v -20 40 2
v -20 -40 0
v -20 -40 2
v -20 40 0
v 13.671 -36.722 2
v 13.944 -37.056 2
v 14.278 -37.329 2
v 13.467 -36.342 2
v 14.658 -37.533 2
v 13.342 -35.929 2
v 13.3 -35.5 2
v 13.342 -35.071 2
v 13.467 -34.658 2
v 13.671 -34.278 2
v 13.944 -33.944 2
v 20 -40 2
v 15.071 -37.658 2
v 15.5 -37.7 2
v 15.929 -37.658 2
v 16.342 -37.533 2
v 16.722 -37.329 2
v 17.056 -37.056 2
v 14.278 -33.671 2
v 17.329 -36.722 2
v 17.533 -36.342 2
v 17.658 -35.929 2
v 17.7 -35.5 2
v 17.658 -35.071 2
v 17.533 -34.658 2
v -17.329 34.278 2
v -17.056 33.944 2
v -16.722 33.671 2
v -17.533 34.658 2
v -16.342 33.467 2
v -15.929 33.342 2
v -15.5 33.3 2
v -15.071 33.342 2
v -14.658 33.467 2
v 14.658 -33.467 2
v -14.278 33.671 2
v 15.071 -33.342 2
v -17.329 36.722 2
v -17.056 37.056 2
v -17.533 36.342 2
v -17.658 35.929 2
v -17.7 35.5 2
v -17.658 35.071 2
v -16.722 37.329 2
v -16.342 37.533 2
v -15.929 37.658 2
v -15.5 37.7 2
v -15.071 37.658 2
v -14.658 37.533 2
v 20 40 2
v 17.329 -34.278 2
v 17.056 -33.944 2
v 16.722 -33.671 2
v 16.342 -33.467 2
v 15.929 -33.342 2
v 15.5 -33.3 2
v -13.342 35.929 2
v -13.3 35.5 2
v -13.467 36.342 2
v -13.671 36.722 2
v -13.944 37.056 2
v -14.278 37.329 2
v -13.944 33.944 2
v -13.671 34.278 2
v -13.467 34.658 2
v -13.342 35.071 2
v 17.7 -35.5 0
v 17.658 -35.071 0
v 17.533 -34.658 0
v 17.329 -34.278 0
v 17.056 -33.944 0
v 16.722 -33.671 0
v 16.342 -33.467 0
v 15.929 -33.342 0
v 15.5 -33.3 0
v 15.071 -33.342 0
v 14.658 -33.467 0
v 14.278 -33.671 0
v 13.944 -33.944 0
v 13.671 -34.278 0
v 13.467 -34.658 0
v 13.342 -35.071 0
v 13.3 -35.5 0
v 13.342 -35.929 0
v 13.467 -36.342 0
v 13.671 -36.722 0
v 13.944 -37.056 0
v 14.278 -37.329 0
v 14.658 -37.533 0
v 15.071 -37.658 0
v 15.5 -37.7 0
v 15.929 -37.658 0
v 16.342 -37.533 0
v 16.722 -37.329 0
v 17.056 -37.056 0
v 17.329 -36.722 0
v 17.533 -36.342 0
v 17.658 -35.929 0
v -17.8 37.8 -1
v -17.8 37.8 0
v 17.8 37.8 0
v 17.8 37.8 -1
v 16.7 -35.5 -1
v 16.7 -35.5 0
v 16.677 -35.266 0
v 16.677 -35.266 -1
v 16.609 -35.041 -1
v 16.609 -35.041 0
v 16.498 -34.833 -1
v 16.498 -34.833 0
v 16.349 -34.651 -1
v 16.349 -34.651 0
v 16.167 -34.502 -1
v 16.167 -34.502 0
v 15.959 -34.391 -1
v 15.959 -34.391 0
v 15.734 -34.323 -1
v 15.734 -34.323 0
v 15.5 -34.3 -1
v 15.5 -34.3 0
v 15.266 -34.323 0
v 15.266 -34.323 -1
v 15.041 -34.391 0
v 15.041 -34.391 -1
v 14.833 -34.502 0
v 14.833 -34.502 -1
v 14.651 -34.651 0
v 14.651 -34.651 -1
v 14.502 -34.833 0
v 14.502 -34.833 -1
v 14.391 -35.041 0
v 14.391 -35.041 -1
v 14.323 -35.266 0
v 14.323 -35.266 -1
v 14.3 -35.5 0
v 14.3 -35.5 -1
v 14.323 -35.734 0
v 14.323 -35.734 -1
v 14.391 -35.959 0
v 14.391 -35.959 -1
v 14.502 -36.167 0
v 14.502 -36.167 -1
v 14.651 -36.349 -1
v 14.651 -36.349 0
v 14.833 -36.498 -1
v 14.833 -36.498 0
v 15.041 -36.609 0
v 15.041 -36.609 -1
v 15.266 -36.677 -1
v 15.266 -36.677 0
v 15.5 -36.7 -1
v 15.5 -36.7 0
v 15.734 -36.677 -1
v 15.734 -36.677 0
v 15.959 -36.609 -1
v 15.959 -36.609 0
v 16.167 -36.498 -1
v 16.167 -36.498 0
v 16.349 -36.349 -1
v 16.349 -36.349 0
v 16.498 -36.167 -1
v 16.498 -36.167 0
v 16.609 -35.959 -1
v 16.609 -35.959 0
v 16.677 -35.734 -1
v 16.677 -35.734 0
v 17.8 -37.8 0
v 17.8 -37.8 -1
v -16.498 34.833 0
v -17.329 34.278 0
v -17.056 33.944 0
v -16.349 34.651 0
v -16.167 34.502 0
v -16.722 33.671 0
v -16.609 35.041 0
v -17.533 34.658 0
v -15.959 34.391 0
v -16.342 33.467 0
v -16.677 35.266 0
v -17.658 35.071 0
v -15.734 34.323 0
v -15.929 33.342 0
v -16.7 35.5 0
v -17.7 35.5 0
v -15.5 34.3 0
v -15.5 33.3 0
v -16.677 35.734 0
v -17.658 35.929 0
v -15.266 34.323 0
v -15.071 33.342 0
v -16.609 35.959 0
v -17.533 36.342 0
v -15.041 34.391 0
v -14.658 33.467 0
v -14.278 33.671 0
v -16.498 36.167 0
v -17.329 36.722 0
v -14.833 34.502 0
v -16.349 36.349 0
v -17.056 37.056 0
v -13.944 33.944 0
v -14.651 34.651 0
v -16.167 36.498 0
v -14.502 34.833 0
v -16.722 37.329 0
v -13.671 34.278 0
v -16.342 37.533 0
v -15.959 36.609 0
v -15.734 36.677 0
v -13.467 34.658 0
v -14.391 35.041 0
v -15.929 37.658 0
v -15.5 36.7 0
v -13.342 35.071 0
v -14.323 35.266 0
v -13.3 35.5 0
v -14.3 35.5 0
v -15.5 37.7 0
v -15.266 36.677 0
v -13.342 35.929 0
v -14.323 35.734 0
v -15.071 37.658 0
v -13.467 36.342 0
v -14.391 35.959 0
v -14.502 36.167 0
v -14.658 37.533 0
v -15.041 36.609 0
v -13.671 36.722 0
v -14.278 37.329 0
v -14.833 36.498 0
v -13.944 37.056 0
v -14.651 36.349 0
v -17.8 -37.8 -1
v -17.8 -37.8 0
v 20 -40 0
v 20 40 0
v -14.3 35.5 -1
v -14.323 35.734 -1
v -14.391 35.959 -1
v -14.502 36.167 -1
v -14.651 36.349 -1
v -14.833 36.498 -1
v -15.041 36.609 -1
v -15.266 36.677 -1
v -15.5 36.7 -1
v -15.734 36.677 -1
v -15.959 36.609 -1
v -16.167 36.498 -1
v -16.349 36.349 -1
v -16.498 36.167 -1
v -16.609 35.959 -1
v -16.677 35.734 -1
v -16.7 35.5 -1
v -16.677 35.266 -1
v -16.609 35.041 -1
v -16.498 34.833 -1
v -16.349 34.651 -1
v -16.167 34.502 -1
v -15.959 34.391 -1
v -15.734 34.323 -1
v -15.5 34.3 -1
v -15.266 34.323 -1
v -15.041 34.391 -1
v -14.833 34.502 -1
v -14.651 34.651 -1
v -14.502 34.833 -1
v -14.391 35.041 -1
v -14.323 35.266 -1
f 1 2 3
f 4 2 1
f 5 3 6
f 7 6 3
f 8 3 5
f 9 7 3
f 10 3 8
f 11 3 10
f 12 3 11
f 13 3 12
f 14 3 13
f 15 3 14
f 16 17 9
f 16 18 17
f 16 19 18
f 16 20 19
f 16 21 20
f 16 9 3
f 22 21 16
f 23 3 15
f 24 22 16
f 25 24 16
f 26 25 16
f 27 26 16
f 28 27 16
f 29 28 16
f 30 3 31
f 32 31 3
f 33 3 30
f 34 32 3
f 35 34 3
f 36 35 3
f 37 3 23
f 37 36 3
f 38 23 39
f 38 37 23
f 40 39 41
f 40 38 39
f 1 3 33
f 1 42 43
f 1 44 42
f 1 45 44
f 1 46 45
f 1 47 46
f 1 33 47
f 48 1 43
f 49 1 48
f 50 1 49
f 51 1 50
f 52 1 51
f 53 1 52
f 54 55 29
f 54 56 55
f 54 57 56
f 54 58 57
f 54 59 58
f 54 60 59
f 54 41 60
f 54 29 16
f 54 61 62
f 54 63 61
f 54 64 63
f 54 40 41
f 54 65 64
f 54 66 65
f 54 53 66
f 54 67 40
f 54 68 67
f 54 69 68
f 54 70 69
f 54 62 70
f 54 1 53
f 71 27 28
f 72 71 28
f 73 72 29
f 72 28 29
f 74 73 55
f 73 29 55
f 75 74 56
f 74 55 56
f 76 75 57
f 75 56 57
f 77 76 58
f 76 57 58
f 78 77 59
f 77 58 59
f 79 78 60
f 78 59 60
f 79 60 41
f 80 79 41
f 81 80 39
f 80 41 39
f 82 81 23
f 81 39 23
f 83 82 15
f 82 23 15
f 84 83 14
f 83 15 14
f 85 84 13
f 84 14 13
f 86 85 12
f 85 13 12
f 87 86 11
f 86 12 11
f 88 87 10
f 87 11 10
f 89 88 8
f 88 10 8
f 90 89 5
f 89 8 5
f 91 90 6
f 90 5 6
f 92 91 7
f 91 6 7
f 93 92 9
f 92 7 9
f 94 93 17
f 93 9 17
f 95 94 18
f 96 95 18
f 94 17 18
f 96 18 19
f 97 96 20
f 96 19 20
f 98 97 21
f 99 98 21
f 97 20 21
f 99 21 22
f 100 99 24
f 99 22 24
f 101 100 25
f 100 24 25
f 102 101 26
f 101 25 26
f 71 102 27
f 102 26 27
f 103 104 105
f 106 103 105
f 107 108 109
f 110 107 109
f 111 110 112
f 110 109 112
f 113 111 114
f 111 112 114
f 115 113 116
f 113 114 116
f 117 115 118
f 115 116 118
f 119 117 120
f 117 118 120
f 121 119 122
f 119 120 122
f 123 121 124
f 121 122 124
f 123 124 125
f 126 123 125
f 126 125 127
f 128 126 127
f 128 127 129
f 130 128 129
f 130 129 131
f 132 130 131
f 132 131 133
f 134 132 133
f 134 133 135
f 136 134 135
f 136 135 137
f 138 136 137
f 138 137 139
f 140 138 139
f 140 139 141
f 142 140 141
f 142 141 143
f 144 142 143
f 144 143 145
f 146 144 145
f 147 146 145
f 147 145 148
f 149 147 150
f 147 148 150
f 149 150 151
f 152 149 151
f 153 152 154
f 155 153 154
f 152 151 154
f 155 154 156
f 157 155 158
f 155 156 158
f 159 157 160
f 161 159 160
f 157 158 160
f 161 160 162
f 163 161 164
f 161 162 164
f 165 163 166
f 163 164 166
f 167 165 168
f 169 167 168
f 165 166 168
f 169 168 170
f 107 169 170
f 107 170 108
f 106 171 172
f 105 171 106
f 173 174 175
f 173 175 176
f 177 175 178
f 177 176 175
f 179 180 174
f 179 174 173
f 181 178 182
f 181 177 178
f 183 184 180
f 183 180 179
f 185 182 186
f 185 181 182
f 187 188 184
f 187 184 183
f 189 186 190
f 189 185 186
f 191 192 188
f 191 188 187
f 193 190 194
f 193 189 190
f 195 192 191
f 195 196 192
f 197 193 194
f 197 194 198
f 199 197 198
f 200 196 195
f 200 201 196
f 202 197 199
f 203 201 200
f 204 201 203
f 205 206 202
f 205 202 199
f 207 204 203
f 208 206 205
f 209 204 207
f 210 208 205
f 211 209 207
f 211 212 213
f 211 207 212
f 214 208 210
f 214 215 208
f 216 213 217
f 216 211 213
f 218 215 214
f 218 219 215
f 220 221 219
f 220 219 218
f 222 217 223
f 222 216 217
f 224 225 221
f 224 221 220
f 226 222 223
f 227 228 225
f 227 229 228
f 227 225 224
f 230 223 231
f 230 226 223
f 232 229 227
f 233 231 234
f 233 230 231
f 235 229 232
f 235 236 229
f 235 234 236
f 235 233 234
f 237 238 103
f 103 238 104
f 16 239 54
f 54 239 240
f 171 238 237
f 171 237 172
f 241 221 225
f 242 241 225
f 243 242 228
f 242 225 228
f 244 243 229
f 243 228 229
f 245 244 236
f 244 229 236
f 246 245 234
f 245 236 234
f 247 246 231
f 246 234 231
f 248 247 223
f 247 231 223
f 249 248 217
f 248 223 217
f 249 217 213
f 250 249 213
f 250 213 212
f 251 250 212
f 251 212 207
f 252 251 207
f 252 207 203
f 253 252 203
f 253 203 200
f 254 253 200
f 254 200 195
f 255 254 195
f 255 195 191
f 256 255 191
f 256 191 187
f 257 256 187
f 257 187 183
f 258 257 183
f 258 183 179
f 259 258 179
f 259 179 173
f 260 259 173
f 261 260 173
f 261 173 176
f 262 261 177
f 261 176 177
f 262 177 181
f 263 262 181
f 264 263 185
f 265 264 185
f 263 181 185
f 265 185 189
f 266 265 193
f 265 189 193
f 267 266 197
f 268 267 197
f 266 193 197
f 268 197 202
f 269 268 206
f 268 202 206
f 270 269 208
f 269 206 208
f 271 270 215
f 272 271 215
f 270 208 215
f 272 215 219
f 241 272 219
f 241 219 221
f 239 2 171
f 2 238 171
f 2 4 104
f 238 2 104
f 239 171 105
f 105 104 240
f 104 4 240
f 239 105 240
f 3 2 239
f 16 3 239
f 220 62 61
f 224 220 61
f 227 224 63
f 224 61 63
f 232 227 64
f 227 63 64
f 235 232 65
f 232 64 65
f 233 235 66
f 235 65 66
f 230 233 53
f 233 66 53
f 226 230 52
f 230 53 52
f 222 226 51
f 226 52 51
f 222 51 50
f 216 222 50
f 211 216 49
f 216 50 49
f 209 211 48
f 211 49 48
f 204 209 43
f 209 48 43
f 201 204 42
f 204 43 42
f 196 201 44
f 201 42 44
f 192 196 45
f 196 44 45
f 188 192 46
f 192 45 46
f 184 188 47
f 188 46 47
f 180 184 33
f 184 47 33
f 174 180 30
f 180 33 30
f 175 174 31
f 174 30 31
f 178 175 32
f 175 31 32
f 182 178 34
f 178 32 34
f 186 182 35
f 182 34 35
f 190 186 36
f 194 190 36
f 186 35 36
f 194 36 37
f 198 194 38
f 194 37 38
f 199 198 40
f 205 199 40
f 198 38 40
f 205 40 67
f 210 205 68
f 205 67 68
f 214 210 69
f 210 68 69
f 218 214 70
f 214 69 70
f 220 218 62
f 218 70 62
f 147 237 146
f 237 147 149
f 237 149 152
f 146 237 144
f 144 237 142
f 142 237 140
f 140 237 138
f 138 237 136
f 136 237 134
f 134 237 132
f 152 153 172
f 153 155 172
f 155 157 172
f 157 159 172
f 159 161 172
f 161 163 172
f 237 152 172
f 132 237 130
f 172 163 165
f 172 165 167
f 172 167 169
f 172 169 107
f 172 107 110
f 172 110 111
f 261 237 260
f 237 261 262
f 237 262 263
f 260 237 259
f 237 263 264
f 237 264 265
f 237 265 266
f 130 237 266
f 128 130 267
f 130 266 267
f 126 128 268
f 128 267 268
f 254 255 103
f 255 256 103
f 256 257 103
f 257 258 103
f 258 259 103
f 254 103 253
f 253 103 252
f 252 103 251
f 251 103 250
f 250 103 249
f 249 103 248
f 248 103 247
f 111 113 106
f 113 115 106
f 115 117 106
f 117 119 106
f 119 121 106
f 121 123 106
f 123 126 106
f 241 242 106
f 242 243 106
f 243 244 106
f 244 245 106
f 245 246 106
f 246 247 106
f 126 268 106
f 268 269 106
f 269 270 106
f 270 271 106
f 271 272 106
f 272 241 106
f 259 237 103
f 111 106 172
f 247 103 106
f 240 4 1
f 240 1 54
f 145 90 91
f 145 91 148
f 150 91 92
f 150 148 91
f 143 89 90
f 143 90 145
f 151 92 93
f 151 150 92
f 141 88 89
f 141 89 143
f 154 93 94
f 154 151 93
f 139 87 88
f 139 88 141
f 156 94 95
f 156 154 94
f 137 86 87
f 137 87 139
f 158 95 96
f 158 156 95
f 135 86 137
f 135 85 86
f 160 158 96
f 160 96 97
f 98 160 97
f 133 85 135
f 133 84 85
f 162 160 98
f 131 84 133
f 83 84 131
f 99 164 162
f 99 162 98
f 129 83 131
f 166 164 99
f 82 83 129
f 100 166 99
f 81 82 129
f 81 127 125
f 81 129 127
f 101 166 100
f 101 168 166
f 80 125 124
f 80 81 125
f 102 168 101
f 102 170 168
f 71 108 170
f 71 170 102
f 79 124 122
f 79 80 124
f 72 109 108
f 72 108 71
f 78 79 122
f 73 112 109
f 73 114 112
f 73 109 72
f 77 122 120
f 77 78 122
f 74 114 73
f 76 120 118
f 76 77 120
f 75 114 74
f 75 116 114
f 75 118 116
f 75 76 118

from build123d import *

# Parameters (mm, degrees)
ESQUISSE1_W             = 40
ESQUISSE1_H             = 80
BOSS_EXTRU_1_DEPTH      = 2
ESQUISSE1_3_W           = 35.6
ESQUISSE1_3_H           = 75.6
BOSS_EXTRU_2_DEPTH      = 1
ESQUISSE2_R             = 1.2
ENL_V_MAT_EXTRU_1_DEPTH = 45.821869662
ESQUISSE2_3_R           = 2.2
ESQUISSE2_3_R_2         = 1.2
ENL_V_MAT_EXTRU_2_DEPTH = 2


with BuildPart() as part:
    # Esquisse1 → Boss.-Extru.1 (new body)
    with BuildSketch(Plane.XY):
        Rectangle(ESQUISSE1_W, ESQUISSE1_H)
    extrude(amount=BOSS_EXTRU_1_DEPTH)

    # Esquisse1<3> → Boss.-Extru.2 (add)
    with BuildSketch(Plane.XY):
        Rectangle(ESQUISSE1_3_W, ESQUISSE1_3_H)
    extrude(amount=-BOSS_EXTRU_2_DEPTH)

    # Esquisse2 → Enlèv. mat.-Extru.1 (cut, through all)
    with BuildSketch(Plane.XY.offset(2)):
        with Locations((-15.5, 35.5)):
            Circle(ESQUISSE2_R)
        with Locations((15.5, -35.5)):
            Circle(ESQUISSE2_R)
    extrude(amount=-ENL_V_MAT_EXTRU_1_DEPTH, mode=Mode.SUBTRACT)

    # Esquisse2<3> → Enlèv. mat.-Extru.2 (cut)
    # profile 1 of 2: a face of its own
    with BuildSketch(Plane.XY.offset(2)):
        with Locations((-15.5, 35.5)):
            Circle(ESQUISSE2_3_R)
        with Locations((-15.5, 35.5)):
            Circle(ESQUISSE2_3_R_2, mode=Mode.SUBTRACT)
    # profile 2 of 2: a face of its own
    with BuildSketch(Plane.XY.offset(2)):
        with Locations((15.5, -35.5)):
            Circle(ESQUISSE2_3_R)
        with Locations((15.5, -35.5)):
            Circle(ESQUISSE2_3_R_2, mode=Mode.SUBTRACT)
    extrude(amount=-ENL_V_MAT_EXTRU_2_DEPTH, mode=Mode.SUBTRACT)


solid = part.part
